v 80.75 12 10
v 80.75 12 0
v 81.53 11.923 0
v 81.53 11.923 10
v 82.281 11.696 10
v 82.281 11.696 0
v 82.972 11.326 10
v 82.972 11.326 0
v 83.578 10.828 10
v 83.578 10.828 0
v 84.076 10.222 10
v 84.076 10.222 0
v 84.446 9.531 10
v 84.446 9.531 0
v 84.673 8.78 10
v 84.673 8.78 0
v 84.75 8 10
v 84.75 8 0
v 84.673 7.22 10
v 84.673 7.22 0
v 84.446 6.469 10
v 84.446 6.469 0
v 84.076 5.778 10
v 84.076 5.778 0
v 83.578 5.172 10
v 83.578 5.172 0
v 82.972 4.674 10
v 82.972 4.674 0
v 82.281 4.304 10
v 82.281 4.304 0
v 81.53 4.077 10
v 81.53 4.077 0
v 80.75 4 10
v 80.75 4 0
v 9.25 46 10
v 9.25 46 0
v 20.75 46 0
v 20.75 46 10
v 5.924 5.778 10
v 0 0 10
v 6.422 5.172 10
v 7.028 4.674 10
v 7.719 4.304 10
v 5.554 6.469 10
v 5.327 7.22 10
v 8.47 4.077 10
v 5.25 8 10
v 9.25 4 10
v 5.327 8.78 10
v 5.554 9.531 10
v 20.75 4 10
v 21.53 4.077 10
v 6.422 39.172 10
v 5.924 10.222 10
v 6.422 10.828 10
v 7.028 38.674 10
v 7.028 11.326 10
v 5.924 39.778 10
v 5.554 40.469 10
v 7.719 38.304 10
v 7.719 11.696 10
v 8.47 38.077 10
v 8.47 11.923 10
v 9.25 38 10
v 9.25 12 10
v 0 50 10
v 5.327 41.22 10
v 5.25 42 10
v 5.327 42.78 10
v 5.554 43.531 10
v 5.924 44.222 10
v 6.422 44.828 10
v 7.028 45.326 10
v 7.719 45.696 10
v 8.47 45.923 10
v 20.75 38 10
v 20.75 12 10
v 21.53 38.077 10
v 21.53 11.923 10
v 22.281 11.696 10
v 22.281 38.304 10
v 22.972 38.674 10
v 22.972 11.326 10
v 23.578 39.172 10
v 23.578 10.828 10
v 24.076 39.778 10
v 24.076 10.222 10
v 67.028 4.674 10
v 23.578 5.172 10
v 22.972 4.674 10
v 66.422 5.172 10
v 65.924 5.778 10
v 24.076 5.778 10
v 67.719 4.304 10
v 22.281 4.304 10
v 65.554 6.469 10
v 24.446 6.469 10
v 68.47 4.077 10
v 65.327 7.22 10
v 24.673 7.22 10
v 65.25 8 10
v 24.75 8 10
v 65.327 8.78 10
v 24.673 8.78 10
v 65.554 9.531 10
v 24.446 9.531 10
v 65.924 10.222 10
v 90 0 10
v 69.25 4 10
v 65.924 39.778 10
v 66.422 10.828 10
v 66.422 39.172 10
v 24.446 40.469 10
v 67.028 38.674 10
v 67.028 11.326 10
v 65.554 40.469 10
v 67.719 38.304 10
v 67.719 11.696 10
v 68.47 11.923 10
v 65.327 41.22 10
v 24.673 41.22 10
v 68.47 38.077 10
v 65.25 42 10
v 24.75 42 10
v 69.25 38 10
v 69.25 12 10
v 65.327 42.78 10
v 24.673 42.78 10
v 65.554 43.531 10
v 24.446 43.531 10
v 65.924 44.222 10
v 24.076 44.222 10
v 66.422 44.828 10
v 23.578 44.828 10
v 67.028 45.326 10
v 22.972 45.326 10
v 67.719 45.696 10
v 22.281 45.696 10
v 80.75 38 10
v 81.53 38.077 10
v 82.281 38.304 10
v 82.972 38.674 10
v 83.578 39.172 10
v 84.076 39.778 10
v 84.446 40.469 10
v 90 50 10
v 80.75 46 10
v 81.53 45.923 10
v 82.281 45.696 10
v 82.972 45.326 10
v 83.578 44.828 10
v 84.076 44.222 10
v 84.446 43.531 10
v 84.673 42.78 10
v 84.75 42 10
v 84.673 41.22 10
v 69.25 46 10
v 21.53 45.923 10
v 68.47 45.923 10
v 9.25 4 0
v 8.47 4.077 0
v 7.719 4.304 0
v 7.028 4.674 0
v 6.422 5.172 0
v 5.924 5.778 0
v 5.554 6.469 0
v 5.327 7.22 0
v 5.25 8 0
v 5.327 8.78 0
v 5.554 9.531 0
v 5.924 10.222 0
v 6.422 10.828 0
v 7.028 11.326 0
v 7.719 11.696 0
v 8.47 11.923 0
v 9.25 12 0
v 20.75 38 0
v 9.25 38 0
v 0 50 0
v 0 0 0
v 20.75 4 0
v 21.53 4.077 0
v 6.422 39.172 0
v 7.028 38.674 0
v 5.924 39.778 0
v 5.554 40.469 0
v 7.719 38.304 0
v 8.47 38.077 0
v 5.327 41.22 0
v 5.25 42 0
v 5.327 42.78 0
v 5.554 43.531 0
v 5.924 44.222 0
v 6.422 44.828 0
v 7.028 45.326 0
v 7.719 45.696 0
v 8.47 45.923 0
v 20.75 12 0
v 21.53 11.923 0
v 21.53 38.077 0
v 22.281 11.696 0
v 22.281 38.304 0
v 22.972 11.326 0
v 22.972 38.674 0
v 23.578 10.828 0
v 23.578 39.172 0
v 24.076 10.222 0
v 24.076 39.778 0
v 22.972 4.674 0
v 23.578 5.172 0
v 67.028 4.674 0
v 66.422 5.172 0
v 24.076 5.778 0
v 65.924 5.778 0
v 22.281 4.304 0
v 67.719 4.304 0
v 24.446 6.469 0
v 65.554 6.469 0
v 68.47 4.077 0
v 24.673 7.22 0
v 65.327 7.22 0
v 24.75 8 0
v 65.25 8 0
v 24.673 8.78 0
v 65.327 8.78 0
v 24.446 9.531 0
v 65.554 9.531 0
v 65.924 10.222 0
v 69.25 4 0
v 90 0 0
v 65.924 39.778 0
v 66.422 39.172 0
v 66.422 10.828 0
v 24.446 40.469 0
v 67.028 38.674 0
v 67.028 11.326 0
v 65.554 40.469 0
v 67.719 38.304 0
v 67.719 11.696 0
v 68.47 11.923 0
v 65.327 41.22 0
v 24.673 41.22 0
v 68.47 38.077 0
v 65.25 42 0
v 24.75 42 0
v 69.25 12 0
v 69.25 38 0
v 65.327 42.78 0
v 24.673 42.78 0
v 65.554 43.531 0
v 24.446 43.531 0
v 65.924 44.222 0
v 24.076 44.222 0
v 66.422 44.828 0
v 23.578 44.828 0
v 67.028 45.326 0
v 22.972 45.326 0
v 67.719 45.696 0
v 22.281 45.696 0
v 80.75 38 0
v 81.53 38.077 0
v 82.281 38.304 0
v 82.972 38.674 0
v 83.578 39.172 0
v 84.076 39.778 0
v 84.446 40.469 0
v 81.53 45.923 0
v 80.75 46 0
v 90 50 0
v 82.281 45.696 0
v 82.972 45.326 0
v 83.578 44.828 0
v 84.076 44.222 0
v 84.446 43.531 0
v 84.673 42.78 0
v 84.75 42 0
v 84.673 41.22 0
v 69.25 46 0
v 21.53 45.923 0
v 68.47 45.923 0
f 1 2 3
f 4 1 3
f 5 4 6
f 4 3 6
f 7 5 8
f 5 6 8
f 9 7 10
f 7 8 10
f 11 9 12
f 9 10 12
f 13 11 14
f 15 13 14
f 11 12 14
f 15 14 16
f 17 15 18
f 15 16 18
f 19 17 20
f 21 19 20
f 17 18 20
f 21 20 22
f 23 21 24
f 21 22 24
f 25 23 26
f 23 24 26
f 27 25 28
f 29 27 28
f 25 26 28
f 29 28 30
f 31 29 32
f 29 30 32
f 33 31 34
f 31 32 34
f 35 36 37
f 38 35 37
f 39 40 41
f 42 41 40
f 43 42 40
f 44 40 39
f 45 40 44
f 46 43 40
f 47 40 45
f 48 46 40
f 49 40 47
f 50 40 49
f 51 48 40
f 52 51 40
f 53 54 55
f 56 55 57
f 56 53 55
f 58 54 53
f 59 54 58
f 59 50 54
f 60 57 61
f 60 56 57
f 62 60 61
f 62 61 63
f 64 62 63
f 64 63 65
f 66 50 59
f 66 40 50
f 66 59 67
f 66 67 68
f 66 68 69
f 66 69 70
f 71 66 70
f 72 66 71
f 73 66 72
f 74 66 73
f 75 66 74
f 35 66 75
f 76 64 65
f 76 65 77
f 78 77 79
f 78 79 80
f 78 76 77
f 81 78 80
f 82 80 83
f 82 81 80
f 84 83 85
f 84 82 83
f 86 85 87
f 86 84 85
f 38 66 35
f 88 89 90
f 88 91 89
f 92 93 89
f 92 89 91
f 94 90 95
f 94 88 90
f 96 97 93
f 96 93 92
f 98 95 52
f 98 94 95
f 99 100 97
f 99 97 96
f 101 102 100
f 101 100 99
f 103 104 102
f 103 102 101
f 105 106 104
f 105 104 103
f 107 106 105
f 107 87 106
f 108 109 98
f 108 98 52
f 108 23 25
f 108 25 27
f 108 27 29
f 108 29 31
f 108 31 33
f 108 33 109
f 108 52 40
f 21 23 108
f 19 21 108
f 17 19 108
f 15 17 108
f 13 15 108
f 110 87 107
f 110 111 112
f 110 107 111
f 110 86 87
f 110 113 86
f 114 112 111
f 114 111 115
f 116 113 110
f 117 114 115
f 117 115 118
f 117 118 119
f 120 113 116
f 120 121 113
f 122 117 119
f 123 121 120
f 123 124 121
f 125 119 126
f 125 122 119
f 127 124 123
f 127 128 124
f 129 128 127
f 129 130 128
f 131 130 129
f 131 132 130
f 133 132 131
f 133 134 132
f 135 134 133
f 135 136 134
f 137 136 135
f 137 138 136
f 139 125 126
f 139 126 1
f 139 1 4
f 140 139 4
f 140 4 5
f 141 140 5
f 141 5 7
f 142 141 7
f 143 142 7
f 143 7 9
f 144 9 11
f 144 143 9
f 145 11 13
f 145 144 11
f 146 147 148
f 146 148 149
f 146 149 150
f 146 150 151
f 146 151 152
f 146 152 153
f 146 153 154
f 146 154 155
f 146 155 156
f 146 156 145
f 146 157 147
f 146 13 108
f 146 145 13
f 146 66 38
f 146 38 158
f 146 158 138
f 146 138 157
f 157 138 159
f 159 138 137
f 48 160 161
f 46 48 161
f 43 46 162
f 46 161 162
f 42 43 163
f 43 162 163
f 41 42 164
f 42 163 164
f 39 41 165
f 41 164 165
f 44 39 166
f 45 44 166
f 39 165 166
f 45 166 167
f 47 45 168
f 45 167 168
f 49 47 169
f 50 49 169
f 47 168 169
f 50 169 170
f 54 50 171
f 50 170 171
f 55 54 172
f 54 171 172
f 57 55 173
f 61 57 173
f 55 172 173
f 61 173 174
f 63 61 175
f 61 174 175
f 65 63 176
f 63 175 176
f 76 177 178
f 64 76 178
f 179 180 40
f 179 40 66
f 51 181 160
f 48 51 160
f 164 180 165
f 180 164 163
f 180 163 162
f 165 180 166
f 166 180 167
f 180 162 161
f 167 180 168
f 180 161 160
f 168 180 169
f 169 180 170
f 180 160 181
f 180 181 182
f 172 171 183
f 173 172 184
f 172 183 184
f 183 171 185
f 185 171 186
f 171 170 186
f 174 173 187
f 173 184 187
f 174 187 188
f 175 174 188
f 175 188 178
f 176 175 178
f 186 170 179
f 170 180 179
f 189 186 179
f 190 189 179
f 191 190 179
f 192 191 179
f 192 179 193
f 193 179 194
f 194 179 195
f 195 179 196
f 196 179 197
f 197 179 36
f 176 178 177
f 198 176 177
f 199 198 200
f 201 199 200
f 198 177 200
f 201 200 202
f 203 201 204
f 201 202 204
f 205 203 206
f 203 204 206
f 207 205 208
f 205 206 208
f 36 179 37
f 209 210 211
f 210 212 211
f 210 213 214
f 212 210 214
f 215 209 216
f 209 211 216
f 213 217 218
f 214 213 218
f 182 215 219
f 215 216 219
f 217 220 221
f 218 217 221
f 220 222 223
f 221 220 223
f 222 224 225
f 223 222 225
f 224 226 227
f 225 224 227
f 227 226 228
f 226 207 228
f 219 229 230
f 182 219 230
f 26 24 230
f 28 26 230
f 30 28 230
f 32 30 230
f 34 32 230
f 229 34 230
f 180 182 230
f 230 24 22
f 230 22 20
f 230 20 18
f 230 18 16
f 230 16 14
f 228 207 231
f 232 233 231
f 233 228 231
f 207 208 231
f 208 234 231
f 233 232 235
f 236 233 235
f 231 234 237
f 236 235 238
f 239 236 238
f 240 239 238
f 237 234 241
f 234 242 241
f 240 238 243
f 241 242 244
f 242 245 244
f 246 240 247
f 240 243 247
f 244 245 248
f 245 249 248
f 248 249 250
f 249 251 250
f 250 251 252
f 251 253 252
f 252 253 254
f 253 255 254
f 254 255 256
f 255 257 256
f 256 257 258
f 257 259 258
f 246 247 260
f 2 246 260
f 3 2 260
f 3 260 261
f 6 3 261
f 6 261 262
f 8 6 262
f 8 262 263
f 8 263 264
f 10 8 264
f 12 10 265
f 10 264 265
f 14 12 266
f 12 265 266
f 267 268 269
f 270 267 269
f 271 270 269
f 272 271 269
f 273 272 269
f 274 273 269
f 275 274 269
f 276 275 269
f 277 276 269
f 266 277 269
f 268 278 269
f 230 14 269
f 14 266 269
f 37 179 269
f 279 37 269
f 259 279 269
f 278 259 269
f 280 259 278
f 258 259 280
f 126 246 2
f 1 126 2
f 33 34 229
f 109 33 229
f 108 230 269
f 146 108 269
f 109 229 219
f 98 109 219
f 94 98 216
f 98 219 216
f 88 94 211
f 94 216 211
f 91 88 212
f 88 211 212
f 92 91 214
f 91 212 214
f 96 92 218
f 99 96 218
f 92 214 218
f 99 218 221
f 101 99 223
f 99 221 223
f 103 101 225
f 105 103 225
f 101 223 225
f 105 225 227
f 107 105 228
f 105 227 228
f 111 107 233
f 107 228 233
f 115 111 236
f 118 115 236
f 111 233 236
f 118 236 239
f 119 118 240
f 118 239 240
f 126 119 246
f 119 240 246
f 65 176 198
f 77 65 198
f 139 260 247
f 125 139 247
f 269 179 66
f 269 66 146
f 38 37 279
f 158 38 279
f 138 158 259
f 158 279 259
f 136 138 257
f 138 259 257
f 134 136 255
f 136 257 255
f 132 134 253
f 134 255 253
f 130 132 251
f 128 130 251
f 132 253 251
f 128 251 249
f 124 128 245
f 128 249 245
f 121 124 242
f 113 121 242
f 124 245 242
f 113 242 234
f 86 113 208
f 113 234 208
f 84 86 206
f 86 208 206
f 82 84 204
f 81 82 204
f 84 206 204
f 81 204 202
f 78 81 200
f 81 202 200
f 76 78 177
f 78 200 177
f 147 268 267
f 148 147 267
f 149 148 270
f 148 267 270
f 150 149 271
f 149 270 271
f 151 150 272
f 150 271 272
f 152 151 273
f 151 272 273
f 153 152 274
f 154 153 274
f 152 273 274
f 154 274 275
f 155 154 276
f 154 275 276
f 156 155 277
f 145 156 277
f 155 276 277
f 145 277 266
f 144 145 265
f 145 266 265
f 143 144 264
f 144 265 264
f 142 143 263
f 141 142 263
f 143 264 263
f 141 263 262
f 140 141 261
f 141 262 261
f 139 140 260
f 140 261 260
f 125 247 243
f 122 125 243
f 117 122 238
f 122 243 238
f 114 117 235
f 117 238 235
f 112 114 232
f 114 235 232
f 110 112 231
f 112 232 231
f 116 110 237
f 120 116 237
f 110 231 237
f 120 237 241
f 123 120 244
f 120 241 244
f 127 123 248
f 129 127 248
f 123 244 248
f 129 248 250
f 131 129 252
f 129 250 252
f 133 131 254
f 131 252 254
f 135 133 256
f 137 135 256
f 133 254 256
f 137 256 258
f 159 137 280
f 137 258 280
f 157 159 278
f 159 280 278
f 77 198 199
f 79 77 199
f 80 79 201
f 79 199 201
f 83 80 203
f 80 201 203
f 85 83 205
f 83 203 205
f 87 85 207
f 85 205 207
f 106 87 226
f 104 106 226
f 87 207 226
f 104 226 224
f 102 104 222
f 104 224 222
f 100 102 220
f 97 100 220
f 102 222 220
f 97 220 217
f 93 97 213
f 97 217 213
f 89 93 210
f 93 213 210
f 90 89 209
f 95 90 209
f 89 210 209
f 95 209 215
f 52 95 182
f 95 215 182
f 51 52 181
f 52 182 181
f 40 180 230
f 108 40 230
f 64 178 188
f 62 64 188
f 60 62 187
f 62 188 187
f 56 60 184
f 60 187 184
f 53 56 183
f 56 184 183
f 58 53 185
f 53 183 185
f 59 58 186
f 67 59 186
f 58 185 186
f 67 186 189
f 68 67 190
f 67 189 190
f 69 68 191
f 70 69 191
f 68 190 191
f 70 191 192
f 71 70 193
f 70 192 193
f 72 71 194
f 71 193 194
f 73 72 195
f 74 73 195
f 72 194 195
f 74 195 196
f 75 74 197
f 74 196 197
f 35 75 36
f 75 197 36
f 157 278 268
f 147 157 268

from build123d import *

# Parameters (mm, degrees)
ESBO_O3_W                = 90
ESBO_O3_H                = 50
RESSALTO_EXTRUS_O1_DEPTH = 10


with BuildPart() as part:
    # Esboço3 → Ressalto-extrusão1 (new body)
    with BuildSketch(Plane.XY):
        with Locations((45, 25)):
            Rectangle(ESBO_O3_W, ESBO_O3_H)
        with BuildLine():
            Line((9.25, 46), (20.75, 46))
            ThreePointArc((20.75, 46), (24.75, 42), (20.75, 38))
            Line((20.75, 38), (9.25, 38))
            ThreePointArc((9.25, 38), (5.25, 42), (9.25, 46))
        make_face(mode=Mode.SUBTRACT)
        with BuildLine():
            Line((80.75, 38), (69.25, 38))
            ThreePointArc((69.25, 38), (65.25, 42), (69.25, 46))
            Line((69.25, 46), (80.75, 46))
            ThreePointArc((80.75, 46), (84.75, 42), (80.75, 38))
        make_face(mode=Mode.SUBTRACT)
        with BuildLine():
            Line((9.25, 12), (20.75, 12))
            ThreePointArc((20.75, 12), (24.75, 8), (20.75, 4))
            Line((20.75, 4), (9.25, 4))
            ThreePointArc((9.25, 4), (5.25, 8), (9.25, 12))
        make_face(mode=Mode.SUBTRACT)
        with BuildLine():
            Line((69.25, 12), (80.75, 12))
            ThreePointArc((80.75, 12), (84.75, 8), (80.75, 4))
            Line((80.75, 4), (69.25, 4))
            ThreePointArc((69.25, 4), (65.25, 8), (69.25, 12))
        make_face(mode=Mode.SUBTRACT)
    extrude(amount=RESSALTO_EXTRUS_O1_DEPTH)


solid = part.part
